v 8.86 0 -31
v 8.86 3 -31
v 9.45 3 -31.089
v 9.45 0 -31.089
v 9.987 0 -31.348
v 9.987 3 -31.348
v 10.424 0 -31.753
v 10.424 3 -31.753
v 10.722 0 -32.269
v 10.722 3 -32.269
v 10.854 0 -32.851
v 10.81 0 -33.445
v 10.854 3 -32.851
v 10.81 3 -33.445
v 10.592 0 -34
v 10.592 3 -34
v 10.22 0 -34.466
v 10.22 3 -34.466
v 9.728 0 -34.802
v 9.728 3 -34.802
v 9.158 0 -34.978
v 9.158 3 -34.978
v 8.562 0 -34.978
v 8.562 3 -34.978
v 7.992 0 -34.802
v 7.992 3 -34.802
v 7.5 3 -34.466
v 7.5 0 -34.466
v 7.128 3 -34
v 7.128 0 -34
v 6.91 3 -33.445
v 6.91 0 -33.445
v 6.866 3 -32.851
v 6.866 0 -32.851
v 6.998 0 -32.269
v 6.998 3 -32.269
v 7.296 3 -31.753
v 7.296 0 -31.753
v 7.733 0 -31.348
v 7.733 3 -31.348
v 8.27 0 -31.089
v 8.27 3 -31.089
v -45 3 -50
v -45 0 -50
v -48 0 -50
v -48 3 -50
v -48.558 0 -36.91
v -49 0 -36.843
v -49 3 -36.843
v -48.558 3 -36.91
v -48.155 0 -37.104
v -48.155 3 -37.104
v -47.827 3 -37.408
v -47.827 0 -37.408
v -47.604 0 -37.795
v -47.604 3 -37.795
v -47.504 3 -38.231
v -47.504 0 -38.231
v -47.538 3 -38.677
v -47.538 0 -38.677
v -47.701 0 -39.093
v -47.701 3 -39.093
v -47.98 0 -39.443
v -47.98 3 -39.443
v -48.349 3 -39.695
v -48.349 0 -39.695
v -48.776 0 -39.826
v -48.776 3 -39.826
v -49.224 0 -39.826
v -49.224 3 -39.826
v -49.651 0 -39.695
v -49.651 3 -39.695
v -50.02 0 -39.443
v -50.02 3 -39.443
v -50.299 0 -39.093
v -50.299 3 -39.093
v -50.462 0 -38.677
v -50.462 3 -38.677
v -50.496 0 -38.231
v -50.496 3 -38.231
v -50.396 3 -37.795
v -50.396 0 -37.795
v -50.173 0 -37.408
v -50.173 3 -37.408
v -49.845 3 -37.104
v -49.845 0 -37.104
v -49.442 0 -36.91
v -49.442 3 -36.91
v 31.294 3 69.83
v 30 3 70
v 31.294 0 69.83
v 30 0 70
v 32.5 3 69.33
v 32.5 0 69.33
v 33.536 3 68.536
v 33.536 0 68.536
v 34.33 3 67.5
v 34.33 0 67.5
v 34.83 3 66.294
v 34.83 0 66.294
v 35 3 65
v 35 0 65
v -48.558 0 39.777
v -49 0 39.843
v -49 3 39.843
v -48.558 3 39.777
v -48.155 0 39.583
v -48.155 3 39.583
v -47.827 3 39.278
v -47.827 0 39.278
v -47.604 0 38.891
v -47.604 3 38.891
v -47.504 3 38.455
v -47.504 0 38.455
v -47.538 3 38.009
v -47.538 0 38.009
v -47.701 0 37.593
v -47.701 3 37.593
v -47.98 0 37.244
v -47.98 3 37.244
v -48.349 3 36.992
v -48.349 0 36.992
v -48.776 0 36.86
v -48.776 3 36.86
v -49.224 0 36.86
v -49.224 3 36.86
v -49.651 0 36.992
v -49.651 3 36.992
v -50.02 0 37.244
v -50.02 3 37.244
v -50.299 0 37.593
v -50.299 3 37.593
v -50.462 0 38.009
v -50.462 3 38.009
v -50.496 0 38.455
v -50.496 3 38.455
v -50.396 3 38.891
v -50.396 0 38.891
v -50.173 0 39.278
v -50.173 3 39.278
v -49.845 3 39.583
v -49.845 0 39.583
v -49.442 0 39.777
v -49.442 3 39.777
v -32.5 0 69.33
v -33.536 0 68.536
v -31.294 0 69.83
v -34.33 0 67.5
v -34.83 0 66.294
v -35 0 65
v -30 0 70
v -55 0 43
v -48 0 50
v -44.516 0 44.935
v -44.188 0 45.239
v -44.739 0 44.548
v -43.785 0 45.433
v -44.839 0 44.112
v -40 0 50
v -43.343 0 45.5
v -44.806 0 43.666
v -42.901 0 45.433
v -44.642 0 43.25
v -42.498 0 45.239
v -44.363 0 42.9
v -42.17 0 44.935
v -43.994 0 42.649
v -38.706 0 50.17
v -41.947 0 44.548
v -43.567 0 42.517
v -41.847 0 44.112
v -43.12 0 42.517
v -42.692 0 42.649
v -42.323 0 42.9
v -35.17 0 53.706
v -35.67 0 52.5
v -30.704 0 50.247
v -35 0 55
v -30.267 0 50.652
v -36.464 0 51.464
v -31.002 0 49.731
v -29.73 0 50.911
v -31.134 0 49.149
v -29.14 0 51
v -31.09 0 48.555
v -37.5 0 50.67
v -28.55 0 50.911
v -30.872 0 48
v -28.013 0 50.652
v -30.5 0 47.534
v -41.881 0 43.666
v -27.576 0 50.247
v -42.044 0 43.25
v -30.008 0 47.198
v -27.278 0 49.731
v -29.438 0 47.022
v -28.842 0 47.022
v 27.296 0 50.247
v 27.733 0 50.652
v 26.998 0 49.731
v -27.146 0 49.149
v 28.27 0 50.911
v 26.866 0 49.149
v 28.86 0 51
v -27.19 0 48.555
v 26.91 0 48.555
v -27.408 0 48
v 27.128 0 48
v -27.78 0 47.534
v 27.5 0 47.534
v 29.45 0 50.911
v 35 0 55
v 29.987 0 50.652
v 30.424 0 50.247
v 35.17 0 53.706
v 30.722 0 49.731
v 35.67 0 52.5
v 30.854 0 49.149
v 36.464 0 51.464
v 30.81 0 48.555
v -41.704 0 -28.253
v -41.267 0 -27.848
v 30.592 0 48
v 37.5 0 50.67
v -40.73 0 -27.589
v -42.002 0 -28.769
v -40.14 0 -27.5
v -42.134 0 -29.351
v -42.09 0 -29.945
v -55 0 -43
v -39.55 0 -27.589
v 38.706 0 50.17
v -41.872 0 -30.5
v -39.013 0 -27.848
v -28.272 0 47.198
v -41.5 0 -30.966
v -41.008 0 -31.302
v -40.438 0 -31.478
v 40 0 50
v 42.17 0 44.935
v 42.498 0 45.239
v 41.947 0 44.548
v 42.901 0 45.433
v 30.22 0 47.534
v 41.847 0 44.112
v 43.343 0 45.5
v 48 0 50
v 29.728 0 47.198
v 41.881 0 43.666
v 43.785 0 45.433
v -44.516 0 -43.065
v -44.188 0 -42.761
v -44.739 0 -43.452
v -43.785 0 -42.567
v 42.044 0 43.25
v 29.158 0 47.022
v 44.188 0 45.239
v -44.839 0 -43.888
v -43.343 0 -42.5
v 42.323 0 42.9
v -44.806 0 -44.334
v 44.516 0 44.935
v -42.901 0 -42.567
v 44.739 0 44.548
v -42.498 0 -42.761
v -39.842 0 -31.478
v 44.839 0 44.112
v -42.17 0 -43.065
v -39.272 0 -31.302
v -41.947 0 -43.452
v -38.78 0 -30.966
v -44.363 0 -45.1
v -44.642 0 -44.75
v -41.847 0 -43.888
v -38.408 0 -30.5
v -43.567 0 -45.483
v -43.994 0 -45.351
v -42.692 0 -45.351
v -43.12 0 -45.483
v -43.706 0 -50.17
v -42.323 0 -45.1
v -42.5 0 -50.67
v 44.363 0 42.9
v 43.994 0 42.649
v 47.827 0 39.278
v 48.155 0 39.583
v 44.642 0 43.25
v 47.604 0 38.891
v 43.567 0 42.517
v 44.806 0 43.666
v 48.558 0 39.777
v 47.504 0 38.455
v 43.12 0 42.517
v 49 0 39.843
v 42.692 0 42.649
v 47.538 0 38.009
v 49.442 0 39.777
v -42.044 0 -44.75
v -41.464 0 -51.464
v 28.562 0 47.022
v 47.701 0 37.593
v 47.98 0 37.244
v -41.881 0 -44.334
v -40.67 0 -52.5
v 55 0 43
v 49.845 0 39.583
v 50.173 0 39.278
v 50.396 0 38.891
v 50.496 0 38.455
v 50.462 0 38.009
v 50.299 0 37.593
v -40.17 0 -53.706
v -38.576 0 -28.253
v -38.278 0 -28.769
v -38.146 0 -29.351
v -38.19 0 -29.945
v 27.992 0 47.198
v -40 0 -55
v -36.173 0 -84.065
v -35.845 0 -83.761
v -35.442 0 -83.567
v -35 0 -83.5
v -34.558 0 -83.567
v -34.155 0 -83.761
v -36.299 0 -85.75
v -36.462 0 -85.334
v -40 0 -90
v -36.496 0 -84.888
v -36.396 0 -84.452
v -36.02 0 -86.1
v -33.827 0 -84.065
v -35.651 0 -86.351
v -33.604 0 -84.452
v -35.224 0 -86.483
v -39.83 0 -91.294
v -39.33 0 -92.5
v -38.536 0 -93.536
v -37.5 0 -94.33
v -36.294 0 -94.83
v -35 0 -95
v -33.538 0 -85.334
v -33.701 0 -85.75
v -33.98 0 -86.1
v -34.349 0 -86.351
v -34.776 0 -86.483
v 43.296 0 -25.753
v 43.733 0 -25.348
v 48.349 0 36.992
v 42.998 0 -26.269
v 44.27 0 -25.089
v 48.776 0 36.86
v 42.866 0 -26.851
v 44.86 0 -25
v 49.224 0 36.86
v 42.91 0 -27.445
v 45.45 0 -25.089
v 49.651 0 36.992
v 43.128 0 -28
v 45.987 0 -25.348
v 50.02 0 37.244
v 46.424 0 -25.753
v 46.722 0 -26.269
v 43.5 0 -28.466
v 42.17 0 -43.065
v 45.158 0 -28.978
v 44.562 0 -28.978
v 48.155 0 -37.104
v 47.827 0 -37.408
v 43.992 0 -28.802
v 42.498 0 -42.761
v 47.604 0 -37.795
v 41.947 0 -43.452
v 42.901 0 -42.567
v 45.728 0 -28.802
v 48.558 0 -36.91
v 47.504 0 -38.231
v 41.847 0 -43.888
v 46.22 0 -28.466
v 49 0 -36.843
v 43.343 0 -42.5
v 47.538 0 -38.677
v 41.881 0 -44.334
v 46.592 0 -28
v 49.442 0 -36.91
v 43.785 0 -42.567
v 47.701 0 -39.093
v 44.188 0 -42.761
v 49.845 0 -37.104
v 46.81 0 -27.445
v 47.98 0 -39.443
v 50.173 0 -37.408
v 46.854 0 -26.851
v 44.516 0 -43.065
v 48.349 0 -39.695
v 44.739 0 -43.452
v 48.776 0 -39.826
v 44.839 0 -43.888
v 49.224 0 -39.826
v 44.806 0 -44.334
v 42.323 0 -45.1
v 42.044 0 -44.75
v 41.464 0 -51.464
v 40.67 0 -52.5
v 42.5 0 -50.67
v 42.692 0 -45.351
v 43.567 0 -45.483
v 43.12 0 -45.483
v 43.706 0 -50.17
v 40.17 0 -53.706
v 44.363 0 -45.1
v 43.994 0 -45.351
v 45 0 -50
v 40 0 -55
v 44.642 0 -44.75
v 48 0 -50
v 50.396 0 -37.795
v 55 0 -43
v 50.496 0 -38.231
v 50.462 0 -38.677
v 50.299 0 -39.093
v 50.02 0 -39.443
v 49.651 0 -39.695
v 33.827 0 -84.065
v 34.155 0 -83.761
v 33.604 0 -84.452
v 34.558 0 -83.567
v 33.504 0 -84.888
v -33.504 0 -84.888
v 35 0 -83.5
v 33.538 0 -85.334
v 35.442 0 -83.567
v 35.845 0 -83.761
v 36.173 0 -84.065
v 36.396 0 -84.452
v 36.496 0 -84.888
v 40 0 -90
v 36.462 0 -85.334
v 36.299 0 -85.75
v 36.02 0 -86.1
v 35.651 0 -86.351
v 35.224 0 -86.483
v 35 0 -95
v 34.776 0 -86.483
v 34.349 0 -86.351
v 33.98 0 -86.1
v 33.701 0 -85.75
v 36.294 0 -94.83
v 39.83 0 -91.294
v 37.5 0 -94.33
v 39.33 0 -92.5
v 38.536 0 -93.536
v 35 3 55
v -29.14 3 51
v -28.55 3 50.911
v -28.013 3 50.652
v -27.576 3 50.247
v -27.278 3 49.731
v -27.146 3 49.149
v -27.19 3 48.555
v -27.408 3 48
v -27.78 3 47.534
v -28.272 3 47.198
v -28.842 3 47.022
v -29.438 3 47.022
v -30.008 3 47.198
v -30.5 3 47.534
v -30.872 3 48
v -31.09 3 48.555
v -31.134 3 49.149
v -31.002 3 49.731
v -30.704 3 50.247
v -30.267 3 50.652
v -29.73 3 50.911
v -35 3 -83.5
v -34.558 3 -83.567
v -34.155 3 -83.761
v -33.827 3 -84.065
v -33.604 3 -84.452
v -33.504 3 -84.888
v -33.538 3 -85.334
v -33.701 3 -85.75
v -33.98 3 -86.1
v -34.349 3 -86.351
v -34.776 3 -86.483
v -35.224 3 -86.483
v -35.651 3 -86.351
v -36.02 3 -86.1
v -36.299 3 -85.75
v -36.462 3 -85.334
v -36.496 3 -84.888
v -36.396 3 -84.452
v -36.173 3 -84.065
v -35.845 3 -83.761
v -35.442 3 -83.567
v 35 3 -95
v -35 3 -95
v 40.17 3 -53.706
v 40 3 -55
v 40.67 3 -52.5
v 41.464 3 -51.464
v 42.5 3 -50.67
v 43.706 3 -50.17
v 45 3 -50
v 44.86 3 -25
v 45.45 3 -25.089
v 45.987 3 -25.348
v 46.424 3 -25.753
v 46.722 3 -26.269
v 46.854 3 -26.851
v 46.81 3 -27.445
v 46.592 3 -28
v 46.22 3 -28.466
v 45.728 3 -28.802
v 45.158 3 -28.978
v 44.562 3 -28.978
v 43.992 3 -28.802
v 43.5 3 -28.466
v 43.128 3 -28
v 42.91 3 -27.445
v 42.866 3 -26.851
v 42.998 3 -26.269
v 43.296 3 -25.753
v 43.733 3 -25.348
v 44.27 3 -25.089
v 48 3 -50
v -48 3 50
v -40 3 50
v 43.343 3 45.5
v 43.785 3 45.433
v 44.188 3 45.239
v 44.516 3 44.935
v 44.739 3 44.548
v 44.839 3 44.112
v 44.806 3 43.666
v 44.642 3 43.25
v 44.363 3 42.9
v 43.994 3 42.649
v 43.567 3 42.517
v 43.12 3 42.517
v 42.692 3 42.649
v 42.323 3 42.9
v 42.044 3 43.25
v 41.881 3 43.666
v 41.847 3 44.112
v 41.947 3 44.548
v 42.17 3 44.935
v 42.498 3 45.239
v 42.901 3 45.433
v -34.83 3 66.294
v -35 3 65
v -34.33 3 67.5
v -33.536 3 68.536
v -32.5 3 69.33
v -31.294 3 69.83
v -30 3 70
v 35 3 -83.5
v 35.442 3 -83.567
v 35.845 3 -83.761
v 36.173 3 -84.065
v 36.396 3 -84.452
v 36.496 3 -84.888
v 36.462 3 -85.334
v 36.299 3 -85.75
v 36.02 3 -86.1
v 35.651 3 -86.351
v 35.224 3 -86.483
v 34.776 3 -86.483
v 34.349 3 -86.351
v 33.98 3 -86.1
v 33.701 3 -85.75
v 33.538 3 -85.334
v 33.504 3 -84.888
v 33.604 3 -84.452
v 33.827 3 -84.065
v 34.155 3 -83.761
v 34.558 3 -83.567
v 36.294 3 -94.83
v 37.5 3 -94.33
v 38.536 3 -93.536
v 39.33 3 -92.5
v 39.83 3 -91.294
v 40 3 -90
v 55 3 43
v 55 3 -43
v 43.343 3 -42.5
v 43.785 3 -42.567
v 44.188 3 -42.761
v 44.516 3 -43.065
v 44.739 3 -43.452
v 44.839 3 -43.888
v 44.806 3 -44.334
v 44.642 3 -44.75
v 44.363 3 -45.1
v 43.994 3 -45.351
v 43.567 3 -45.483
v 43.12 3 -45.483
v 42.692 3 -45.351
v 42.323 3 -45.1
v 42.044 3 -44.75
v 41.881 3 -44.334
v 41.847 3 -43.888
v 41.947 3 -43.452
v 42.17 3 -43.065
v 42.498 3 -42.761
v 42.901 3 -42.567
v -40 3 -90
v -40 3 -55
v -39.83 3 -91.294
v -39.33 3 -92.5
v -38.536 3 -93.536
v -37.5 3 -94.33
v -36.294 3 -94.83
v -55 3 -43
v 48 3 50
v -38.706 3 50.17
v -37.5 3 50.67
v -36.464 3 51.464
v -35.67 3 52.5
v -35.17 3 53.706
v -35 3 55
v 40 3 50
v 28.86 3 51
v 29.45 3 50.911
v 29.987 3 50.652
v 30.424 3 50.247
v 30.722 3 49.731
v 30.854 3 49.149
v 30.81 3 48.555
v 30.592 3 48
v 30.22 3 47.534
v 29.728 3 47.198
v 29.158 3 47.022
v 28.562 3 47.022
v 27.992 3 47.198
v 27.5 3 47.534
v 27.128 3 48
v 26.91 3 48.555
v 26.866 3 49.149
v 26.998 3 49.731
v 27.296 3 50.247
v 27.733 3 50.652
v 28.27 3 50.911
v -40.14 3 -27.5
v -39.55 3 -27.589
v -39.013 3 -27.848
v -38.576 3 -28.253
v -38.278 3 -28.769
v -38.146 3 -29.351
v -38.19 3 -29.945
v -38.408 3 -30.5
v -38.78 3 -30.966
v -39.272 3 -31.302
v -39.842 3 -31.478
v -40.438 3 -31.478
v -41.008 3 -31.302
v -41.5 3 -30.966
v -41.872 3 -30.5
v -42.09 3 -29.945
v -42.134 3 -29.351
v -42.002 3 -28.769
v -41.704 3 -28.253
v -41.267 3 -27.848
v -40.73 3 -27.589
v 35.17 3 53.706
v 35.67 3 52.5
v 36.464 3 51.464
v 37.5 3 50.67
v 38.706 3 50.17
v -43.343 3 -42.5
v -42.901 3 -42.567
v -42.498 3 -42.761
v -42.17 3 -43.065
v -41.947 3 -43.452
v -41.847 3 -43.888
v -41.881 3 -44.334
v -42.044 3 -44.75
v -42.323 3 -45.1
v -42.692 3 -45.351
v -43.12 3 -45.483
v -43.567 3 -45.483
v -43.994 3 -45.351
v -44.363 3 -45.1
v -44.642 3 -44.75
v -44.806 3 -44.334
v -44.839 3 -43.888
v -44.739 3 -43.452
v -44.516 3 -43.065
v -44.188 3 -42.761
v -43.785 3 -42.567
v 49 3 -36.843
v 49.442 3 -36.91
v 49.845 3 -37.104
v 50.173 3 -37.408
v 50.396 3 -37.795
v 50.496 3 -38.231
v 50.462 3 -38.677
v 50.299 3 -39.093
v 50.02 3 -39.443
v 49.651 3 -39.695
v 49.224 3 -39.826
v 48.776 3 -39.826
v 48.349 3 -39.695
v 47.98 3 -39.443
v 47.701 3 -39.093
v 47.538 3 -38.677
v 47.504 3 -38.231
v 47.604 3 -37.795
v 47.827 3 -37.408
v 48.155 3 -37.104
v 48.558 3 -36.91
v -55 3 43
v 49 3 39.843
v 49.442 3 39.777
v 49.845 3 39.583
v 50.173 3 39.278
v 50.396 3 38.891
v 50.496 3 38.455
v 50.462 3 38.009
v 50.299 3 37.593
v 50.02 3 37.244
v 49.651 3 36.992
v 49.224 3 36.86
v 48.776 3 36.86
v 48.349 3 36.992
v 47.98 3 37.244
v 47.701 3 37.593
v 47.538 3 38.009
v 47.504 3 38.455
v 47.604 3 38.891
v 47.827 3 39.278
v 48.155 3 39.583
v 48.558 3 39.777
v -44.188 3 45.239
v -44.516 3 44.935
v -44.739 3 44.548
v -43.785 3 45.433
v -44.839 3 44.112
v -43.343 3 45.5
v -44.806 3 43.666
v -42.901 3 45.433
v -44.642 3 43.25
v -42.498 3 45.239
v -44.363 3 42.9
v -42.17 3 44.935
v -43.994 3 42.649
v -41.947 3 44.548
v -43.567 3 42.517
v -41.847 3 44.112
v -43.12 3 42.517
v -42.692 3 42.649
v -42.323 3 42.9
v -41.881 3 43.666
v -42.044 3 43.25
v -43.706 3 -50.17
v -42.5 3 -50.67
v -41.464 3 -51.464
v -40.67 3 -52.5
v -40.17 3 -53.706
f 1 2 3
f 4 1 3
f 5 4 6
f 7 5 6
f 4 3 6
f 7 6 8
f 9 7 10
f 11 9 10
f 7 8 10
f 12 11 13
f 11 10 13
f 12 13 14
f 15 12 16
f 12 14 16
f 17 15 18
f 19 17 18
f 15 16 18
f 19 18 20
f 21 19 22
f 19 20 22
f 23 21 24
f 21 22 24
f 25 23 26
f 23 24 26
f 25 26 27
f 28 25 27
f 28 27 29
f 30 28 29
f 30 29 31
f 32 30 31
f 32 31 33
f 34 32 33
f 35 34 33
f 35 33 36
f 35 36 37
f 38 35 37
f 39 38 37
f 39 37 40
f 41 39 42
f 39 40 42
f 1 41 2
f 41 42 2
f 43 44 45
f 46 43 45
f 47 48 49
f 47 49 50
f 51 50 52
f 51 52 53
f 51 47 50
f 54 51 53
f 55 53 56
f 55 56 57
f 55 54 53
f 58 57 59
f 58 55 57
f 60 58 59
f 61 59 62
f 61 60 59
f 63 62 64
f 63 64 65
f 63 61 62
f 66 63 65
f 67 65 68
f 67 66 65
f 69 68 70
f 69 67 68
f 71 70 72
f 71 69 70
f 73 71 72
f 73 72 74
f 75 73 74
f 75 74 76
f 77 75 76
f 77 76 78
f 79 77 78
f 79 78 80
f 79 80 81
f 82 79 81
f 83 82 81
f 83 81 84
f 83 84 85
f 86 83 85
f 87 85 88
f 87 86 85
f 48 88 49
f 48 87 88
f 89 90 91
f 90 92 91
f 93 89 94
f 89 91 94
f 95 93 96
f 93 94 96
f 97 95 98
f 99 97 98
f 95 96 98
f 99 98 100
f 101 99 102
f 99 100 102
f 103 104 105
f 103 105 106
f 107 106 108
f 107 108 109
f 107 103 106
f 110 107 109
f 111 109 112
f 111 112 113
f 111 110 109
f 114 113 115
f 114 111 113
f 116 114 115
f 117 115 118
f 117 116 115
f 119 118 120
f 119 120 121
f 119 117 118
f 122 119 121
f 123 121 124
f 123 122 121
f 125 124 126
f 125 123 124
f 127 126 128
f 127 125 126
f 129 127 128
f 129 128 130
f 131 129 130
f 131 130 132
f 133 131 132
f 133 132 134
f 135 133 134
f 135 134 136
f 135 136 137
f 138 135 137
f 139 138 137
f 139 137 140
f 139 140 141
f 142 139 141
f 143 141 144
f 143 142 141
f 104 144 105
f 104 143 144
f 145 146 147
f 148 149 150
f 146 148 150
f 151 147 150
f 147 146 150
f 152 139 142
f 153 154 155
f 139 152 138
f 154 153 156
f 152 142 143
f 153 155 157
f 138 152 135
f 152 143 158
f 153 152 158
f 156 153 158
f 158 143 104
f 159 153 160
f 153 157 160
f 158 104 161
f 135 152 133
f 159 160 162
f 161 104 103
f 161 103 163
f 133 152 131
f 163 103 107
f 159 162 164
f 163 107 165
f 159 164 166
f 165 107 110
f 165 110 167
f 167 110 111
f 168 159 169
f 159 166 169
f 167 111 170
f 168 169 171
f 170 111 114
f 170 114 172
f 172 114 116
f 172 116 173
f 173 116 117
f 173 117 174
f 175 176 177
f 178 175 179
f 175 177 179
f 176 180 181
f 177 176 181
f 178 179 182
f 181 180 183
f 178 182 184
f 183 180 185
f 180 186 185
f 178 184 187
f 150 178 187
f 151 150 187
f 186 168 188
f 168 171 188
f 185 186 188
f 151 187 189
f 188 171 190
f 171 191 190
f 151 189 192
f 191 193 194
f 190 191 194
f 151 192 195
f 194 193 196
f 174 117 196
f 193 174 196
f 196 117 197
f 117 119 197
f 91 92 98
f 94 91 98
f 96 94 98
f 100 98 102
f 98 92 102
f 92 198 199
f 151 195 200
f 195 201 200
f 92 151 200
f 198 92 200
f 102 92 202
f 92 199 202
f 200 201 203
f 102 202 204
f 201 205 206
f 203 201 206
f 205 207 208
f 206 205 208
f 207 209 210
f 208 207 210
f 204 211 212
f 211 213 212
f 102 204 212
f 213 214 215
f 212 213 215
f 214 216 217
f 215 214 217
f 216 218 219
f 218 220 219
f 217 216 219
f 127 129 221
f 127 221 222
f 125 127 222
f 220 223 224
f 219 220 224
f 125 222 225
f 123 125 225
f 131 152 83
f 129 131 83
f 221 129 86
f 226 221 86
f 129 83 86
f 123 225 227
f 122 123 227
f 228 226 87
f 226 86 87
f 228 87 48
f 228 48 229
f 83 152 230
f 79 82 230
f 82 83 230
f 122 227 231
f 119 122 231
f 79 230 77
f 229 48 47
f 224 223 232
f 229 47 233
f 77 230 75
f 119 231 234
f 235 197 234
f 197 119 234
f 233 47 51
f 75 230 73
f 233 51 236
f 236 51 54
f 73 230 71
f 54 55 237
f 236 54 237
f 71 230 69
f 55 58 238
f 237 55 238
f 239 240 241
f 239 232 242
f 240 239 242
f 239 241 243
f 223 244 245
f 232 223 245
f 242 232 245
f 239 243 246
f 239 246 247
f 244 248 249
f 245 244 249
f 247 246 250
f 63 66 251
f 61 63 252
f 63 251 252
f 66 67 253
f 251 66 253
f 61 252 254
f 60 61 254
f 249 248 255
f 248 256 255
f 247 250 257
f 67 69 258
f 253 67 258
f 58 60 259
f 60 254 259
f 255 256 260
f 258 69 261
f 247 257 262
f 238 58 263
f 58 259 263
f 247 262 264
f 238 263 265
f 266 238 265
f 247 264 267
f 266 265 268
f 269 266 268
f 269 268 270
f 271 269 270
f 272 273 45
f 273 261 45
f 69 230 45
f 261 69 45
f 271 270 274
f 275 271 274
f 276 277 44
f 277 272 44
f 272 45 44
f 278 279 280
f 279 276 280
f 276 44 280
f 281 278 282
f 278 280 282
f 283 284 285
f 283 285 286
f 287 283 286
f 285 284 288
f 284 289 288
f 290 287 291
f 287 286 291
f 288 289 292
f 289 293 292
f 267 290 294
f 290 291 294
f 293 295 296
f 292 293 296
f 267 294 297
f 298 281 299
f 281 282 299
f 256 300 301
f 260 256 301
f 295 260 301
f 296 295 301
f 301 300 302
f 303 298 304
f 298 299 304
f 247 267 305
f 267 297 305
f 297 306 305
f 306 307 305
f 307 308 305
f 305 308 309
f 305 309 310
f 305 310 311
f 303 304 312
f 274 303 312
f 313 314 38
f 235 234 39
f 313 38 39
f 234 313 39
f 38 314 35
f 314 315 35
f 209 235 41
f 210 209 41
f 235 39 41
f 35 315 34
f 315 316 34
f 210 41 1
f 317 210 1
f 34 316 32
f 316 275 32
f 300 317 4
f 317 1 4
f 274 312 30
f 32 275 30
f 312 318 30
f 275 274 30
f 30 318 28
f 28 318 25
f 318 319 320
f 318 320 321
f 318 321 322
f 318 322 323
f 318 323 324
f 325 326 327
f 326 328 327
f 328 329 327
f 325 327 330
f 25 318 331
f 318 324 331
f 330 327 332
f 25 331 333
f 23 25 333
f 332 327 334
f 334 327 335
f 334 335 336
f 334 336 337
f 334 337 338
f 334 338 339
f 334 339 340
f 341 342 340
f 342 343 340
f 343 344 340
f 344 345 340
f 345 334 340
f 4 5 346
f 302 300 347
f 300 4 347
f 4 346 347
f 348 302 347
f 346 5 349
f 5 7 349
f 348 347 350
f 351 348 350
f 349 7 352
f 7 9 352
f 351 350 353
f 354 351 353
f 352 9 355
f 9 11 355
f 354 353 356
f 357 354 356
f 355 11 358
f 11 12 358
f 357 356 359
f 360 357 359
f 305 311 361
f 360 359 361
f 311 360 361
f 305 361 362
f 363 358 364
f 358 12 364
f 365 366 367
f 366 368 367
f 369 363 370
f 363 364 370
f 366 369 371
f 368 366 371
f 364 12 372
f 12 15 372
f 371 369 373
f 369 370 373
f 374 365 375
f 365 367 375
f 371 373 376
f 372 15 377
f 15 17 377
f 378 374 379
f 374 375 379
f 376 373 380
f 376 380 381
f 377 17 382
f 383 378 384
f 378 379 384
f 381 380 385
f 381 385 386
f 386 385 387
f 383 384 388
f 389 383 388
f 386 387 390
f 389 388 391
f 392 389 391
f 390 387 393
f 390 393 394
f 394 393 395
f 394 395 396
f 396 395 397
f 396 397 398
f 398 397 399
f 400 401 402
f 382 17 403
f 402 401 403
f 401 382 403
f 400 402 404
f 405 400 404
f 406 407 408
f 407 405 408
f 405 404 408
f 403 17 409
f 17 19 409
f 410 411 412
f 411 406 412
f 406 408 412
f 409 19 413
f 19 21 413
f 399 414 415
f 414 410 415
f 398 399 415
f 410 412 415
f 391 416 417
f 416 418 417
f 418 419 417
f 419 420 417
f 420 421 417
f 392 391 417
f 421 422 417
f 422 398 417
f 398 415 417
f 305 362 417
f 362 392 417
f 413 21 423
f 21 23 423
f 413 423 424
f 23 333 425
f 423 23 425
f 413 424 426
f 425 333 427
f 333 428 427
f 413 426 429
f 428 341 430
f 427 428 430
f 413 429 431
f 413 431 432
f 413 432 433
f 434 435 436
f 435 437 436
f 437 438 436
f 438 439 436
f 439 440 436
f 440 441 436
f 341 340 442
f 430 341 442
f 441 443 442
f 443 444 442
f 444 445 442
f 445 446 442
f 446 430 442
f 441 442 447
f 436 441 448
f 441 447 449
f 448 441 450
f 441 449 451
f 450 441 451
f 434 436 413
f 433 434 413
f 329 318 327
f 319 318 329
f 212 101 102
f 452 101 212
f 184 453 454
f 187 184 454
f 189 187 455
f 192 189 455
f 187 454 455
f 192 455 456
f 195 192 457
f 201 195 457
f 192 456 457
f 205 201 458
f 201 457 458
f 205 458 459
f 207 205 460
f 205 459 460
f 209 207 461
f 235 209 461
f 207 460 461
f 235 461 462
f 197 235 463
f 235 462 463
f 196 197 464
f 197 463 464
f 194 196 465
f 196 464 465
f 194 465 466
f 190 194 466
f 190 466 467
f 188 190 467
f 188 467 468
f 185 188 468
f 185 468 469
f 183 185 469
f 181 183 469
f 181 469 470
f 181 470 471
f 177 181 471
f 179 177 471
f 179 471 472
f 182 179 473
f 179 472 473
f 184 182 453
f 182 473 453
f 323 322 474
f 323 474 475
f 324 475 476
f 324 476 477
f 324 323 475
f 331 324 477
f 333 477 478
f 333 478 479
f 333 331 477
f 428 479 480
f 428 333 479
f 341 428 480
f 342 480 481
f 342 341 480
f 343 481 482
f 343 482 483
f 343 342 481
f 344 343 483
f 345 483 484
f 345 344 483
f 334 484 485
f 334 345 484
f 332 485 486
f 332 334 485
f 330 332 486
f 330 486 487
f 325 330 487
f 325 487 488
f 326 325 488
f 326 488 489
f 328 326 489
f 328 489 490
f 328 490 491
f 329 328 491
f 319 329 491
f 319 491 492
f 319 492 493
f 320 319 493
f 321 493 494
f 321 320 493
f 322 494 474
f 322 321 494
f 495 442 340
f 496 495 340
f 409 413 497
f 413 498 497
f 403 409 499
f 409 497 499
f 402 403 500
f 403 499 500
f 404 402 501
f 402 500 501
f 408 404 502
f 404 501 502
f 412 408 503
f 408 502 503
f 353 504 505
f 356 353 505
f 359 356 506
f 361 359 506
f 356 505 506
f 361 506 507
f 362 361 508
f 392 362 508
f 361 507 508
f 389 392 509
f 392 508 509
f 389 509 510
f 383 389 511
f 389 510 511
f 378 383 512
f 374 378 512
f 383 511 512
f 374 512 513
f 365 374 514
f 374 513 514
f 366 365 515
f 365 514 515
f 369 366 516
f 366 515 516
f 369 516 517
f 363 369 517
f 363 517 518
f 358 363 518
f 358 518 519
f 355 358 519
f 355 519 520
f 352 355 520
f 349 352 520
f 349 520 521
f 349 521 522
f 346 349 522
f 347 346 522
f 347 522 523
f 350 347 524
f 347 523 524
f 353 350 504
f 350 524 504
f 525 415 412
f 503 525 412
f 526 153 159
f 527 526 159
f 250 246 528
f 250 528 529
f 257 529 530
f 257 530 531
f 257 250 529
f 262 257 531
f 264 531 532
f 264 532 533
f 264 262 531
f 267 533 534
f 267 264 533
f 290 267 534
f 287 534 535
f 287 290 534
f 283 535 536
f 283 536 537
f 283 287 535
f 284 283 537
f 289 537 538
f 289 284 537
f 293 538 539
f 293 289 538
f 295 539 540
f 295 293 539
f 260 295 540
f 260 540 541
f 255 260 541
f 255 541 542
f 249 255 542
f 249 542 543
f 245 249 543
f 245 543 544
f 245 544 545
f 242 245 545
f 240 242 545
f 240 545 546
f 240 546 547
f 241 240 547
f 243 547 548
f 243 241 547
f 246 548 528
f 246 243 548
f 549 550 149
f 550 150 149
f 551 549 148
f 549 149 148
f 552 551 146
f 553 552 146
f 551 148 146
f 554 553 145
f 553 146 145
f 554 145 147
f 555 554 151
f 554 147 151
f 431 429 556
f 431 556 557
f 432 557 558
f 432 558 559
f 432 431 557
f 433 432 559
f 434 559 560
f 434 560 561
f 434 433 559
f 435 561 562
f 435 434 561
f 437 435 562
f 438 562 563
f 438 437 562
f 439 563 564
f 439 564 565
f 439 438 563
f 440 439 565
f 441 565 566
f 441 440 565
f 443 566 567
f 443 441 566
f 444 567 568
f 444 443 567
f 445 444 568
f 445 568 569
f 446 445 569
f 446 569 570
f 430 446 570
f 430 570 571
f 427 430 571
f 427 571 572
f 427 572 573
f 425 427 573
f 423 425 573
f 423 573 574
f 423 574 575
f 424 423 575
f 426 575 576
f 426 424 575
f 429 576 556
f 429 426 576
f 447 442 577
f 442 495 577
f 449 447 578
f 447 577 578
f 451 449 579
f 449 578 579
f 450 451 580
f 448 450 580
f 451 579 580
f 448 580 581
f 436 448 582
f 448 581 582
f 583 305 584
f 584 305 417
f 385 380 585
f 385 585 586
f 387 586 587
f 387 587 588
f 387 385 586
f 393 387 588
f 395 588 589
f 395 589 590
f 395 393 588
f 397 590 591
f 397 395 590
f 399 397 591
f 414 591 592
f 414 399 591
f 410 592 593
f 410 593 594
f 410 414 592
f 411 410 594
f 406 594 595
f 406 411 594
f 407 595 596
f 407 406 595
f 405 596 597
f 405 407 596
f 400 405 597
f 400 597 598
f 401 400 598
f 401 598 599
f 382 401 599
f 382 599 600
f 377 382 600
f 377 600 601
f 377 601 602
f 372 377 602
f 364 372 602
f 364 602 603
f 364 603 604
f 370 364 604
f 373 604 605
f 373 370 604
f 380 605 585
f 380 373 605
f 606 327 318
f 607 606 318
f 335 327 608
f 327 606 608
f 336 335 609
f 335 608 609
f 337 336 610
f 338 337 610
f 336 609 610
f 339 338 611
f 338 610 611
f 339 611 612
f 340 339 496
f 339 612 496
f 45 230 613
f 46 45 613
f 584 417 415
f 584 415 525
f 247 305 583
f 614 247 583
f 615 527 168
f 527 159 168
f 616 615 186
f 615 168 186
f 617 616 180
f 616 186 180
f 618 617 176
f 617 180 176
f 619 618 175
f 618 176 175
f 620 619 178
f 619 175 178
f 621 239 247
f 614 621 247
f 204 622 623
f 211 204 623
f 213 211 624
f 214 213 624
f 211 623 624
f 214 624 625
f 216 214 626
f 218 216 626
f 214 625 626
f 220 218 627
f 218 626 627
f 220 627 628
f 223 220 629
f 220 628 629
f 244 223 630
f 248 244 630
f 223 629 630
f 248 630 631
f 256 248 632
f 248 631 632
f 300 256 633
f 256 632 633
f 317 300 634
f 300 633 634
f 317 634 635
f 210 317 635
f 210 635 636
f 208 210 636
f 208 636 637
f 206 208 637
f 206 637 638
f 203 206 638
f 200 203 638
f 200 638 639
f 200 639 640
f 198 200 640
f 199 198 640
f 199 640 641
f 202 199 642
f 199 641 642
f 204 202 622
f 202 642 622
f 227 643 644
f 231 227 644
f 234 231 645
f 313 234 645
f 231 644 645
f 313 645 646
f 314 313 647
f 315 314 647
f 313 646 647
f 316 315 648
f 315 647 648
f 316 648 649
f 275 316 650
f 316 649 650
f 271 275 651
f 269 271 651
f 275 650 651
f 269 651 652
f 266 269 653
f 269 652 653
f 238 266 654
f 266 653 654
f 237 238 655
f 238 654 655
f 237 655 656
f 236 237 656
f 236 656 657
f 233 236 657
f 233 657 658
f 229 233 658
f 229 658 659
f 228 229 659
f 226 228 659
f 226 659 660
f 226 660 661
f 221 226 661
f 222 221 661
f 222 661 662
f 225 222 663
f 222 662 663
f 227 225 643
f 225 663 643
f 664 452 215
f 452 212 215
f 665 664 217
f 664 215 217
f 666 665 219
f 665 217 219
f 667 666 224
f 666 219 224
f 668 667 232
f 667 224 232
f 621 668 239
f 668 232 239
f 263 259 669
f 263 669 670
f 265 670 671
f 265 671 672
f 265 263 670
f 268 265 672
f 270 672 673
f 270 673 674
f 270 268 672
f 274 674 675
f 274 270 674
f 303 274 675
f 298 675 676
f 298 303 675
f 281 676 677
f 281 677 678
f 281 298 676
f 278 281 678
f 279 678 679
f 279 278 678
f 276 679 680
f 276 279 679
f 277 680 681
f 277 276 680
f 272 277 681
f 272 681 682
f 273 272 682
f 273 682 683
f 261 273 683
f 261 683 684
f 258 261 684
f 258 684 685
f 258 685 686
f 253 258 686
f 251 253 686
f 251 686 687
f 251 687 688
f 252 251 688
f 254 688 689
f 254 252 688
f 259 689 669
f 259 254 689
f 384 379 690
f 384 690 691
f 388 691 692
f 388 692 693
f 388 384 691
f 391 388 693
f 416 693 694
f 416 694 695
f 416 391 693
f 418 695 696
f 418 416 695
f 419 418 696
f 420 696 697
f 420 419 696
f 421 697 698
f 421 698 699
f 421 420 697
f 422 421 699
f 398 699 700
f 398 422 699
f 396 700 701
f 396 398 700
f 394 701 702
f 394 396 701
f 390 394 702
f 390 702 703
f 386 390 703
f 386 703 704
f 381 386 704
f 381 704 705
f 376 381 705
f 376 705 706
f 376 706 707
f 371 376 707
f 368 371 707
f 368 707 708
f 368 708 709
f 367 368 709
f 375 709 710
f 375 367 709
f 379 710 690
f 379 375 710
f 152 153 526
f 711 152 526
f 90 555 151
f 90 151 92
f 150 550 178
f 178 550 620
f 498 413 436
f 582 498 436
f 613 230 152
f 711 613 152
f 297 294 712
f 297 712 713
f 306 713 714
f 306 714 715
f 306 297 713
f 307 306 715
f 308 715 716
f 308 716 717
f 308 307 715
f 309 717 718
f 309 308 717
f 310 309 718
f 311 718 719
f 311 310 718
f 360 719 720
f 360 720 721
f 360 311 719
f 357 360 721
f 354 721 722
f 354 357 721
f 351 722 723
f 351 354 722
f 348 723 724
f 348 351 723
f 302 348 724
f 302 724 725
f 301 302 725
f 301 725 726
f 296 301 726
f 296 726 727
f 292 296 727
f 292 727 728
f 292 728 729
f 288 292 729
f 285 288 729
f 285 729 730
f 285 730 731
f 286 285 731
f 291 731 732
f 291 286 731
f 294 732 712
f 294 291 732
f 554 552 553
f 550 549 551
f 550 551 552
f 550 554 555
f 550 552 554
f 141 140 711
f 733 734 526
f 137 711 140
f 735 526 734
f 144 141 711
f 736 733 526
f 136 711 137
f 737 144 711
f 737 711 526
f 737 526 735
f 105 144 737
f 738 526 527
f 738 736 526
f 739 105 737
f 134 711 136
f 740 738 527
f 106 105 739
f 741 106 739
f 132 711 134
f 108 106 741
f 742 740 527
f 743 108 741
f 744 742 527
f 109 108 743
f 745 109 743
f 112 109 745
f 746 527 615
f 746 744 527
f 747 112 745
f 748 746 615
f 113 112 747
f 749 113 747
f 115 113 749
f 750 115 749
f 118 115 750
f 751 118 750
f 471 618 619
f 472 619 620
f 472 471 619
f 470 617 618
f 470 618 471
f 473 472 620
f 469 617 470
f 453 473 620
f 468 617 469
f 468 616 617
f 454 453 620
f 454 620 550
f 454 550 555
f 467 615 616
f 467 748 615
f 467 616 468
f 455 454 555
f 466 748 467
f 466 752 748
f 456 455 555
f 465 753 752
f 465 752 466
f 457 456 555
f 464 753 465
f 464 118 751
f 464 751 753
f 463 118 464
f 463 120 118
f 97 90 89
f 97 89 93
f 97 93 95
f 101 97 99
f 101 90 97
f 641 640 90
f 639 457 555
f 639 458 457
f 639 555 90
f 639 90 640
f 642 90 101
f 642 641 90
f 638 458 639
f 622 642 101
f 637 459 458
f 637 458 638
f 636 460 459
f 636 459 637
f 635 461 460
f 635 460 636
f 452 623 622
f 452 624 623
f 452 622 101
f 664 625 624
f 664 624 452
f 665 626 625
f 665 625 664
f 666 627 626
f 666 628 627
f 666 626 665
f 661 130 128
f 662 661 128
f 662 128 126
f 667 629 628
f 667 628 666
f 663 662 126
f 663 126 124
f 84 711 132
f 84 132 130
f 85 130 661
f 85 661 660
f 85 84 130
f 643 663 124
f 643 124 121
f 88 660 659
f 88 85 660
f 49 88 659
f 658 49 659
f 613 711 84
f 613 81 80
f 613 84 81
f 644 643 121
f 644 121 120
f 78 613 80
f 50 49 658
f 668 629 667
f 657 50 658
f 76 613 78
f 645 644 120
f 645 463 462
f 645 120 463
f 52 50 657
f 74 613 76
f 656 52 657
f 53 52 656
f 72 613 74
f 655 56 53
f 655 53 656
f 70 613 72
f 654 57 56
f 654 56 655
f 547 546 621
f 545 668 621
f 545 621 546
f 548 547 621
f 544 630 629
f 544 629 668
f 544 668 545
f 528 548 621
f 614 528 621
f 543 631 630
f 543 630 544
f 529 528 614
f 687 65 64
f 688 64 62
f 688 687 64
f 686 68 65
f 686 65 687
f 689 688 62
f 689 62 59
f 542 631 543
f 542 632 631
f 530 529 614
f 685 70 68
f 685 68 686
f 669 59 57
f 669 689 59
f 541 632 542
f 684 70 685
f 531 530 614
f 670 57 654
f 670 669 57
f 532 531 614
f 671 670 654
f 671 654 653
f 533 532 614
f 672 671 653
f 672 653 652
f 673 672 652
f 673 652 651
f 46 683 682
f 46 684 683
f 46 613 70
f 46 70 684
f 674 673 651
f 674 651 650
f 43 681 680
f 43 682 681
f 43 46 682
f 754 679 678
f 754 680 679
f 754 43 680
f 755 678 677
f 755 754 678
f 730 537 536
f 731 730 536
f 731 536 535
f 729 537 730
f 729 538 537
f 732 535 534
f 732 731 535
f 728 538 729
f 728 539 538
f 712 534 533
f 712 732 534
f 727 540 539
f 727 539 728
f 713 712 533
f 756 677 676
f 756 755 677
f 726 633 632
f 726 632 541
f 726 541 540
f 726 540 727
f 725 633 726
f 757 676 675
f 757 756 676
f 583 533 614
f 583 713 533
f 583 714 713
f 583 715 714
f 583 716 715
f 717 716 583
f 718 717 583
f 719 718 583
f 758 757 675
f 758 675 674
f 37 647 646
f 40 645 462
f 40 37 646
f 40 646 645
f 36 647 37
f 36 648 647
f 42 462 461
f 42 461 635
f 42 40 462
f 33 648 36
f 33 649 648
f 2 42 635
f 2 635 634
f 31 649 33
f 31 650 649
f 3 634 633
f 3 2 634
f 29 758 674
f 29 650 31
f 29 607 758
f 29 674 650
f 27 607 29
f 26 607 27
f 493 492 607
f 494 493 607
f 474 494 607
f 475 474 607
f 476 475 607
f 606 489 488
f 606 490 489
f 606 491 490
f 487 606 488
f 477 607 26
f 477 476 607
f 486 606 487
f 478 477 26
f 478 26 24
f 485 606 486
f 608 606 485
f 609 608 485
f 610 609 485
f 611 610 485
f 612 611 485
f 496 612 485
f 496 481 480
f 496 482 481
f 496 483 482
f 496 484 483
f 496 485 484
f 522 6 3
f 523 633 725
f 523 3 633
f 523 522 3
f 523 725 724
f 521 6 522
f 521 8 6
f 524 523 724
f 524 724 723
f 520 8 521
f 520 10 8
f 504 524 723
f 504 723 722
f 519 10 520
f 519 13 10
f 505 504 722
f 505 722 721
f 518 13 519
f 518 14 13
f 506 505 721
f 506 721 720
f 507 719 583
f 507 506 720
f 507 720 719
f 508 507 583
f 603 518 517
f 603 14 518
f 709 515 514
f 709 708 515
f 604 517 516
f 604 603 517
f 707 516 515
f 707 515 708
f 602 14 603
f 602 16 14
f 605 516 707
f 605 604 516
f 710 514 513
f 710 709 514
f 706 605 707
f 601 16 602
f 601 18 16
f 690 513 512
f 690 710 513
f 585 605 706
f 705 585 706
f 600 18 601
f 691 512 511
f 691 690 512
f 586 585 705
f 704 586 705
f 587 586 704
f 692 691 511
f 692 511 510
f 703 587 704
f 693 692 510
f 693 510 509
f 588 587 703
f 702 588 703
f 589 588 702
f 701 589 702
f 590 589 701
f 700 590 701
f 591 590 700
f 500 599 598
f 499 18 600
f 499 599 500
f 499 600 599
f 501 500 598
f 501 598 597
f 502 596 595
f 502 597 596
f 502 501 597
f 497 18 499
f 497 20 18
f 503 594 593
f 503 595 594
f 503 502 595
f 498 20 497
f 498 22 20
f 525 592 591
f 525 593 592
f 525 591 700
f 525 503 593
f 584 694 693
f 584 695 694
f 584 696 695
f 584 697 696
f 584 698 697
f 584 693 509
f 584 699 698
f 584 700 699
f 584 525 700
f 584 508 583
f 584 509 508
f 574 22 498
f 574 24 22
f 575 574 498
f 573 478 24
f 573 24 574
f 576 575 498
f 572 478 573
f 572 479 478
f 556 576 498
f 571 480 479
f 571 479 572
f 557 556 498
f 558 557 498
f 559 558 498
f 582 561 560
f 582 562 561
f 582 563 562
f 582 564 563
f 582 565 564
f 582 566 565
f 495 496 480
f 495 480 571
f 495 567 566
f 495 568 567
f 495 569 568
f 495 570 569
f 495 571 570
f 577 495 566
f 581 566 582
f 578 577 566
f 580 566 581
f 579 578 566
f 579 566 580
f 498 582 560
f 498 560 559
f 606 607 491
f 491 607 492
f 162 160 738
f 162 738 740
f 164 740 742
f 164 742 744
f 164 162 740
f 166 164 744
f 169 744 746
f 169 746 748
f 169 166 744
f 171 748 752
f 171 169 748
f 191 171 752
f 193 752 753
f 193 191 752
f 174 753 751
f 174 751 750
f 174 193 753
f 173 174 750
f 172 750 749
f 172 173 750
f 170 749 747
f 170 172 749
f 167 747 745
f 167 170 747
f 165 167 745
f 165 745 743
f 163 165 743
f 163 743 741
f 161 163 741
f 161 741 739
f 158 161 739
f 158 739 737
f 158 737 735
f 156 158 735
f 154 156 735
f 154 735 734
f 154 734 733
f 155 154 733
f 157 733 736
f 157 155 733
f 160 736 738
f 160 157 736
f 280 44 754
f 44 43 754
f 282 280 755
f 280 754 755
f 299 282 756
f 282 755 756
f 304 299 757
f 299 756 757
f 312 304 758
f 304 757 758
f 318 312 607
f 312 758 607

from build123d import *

# Parameters (mm, degrees)
SKETCH_1_R          = 1.5
EXTRUDE_1_DEPTH     = 3
CHAMFER_1_SIZE      = 7
FILLET_1_R          = 5
SKETCH_2_W          = 70
SKETCH_2_H          = 20
EXTRUDE_2_DEPTH     = 3
SKETCH_3_R          = 2
CUT_EXTRUDE_1_DEPTH = 3
FILLET_2_R          = 5


with BuildPart() as part:
    # 草图1 → 凸台-拉伸1 (new body)
    with BuildSketch(Plane(origin=(0, 0, 0), x_dir=(1, 0, 0), z_dir=(0, 1, 0))):
        Polygon((-55, 50), (-55, -50), (55, -50), (55, 50), (40, 50), (40, 95), (-40, 95), (-40, 50), align=None)
        with Locations(Location((-43.343145751, -44, 0), (0, 0, 270))):
            Circle(SKETCH_1_R, mode=Mode.SUBTRACT)
        with Locations(Location((-49, -38.343145751, 0), (0, 0, 270))):
            Circle(SKETCH_1_R, mode=Mode.SUBTRACT)
        with Locations(Location((43.343145751, -44, 0), (0, 0, 270))):
            Circle(SKETCH_1_R, mode=Mode.SUBTRACT)
        with Locations(Location((49, -38.343145751, 0), (0, 0, 270))):
            Circle(SKETCH_1_R, mode=Mode.SUBTRACT)
        with Locations(Location((-49, 38.343145751, 0), (0, 0, 270))):
            Circle(SKETCH_1_R, mode=Mode.SUBTRACT)
        with Locations(Location((-43.343145751, 44, 0), (0, 0, 270))):
            Circle(SKETCH_1_R, mode=Mode.SUBTRACT)
        with Locations(Location((49, 38.343145751, 0), (0, 0, 270))):
            Circle(SKETCH_1_R, mode=Mode.SUBTRACT)
        with Locations(Location((43.343145751, 44, 0), (0, 0, 270))):
            Circle(SKETCH_1_R, mode=Mode.SUBTRACT)
        with Locations(Location((35, 85, 0), (0, 0, 270))):
            Circle(SKETCH_1_R, mode=Mode.SUBTRACT)
        with Locations(Location((-35, 85, 0), (0, 0, 270))):
            Circle(SKETCH_1_R, mode=Mode.SUBTRACT)
    extrude(amount=EXTRUDE_1_DEPTH)

    # 倒角1
    chamfer_1_edges = [part.edges().sort_by_distance(p)[0] for p in [
        (-55, 1.5, 50),
        (-55, 1.5, -50),
        (55, 1.5, -50),
        (55, 1.5, 50),
    ]]
    chamfer(chamfer_1_edges, length=CHAMFER_1_SIZE)

    # 圆角1
    fillet_1_edges = [part.edges().sort_by_distance(p)[0] for p in [
        (-40, 1.5, -50),
        (-40, 1.5, -95),
        (40, 1.5, -95),
        (40, 1.5, -50),
    ]]
    fillet(fillet_1_edges, radius=FILLET_1_R)

    # 草图2 → 凸台-拉伸2 (add)
    with BuildSketch(Plane(origin=(0, 3, 0), x_dir=(1, 0, 0), z_dir=(0, 1, 0))):
        with Locations((0, -60)):
            Rectangle(SKETCH_2_W, SKETCH_2_H)
    extrude(amount=-EXTRUDE_2_DEPTH)

    # 草图3 → 切除-拉伸1 (cut)
    with BuildSketch(Plane(origin=(0, 3, 0), x_dir=(1, 0, 0), z_dir=(0, 1, 0))):
        with Locations(Location((-40.14, 29.5, 0), (0, 0, 270))):
            Circle(SKETCH_3_R)
        with Locations(Location((44.86, 27, 0), (0, 0, 270))):
            Circle(SKETCH_3_R)
        with Locations(Location((-29.14, -49, 0), (0, 0, 270))):
            Circle(SKETCH_3_R)
        with Locations(Location((28.86, -49, 0), (0, 0, 270))):
            Circle(SKETCH_3_R)
        with Locations(Location((8.86, 33, 0), (0, 0, 270))):
            Circle(SKETCH_3_R)
    extrude(amount=-CUT_EXTRUDE_1_DEPTH, mode=Mode.SUBTRACT)

    # 圆角2
    fillet_2_edges = [part.edges().sort_by_distance(p)[0] for p in [
        (-35, 1.5, 70),
        (-35, 1.5, 50),
        (35, 1.5, 50),
        (35, 1.5, 70),
    ]]
    fillet(fillet_2_edges, radius=FILLET_2_R)


solid = part.part
